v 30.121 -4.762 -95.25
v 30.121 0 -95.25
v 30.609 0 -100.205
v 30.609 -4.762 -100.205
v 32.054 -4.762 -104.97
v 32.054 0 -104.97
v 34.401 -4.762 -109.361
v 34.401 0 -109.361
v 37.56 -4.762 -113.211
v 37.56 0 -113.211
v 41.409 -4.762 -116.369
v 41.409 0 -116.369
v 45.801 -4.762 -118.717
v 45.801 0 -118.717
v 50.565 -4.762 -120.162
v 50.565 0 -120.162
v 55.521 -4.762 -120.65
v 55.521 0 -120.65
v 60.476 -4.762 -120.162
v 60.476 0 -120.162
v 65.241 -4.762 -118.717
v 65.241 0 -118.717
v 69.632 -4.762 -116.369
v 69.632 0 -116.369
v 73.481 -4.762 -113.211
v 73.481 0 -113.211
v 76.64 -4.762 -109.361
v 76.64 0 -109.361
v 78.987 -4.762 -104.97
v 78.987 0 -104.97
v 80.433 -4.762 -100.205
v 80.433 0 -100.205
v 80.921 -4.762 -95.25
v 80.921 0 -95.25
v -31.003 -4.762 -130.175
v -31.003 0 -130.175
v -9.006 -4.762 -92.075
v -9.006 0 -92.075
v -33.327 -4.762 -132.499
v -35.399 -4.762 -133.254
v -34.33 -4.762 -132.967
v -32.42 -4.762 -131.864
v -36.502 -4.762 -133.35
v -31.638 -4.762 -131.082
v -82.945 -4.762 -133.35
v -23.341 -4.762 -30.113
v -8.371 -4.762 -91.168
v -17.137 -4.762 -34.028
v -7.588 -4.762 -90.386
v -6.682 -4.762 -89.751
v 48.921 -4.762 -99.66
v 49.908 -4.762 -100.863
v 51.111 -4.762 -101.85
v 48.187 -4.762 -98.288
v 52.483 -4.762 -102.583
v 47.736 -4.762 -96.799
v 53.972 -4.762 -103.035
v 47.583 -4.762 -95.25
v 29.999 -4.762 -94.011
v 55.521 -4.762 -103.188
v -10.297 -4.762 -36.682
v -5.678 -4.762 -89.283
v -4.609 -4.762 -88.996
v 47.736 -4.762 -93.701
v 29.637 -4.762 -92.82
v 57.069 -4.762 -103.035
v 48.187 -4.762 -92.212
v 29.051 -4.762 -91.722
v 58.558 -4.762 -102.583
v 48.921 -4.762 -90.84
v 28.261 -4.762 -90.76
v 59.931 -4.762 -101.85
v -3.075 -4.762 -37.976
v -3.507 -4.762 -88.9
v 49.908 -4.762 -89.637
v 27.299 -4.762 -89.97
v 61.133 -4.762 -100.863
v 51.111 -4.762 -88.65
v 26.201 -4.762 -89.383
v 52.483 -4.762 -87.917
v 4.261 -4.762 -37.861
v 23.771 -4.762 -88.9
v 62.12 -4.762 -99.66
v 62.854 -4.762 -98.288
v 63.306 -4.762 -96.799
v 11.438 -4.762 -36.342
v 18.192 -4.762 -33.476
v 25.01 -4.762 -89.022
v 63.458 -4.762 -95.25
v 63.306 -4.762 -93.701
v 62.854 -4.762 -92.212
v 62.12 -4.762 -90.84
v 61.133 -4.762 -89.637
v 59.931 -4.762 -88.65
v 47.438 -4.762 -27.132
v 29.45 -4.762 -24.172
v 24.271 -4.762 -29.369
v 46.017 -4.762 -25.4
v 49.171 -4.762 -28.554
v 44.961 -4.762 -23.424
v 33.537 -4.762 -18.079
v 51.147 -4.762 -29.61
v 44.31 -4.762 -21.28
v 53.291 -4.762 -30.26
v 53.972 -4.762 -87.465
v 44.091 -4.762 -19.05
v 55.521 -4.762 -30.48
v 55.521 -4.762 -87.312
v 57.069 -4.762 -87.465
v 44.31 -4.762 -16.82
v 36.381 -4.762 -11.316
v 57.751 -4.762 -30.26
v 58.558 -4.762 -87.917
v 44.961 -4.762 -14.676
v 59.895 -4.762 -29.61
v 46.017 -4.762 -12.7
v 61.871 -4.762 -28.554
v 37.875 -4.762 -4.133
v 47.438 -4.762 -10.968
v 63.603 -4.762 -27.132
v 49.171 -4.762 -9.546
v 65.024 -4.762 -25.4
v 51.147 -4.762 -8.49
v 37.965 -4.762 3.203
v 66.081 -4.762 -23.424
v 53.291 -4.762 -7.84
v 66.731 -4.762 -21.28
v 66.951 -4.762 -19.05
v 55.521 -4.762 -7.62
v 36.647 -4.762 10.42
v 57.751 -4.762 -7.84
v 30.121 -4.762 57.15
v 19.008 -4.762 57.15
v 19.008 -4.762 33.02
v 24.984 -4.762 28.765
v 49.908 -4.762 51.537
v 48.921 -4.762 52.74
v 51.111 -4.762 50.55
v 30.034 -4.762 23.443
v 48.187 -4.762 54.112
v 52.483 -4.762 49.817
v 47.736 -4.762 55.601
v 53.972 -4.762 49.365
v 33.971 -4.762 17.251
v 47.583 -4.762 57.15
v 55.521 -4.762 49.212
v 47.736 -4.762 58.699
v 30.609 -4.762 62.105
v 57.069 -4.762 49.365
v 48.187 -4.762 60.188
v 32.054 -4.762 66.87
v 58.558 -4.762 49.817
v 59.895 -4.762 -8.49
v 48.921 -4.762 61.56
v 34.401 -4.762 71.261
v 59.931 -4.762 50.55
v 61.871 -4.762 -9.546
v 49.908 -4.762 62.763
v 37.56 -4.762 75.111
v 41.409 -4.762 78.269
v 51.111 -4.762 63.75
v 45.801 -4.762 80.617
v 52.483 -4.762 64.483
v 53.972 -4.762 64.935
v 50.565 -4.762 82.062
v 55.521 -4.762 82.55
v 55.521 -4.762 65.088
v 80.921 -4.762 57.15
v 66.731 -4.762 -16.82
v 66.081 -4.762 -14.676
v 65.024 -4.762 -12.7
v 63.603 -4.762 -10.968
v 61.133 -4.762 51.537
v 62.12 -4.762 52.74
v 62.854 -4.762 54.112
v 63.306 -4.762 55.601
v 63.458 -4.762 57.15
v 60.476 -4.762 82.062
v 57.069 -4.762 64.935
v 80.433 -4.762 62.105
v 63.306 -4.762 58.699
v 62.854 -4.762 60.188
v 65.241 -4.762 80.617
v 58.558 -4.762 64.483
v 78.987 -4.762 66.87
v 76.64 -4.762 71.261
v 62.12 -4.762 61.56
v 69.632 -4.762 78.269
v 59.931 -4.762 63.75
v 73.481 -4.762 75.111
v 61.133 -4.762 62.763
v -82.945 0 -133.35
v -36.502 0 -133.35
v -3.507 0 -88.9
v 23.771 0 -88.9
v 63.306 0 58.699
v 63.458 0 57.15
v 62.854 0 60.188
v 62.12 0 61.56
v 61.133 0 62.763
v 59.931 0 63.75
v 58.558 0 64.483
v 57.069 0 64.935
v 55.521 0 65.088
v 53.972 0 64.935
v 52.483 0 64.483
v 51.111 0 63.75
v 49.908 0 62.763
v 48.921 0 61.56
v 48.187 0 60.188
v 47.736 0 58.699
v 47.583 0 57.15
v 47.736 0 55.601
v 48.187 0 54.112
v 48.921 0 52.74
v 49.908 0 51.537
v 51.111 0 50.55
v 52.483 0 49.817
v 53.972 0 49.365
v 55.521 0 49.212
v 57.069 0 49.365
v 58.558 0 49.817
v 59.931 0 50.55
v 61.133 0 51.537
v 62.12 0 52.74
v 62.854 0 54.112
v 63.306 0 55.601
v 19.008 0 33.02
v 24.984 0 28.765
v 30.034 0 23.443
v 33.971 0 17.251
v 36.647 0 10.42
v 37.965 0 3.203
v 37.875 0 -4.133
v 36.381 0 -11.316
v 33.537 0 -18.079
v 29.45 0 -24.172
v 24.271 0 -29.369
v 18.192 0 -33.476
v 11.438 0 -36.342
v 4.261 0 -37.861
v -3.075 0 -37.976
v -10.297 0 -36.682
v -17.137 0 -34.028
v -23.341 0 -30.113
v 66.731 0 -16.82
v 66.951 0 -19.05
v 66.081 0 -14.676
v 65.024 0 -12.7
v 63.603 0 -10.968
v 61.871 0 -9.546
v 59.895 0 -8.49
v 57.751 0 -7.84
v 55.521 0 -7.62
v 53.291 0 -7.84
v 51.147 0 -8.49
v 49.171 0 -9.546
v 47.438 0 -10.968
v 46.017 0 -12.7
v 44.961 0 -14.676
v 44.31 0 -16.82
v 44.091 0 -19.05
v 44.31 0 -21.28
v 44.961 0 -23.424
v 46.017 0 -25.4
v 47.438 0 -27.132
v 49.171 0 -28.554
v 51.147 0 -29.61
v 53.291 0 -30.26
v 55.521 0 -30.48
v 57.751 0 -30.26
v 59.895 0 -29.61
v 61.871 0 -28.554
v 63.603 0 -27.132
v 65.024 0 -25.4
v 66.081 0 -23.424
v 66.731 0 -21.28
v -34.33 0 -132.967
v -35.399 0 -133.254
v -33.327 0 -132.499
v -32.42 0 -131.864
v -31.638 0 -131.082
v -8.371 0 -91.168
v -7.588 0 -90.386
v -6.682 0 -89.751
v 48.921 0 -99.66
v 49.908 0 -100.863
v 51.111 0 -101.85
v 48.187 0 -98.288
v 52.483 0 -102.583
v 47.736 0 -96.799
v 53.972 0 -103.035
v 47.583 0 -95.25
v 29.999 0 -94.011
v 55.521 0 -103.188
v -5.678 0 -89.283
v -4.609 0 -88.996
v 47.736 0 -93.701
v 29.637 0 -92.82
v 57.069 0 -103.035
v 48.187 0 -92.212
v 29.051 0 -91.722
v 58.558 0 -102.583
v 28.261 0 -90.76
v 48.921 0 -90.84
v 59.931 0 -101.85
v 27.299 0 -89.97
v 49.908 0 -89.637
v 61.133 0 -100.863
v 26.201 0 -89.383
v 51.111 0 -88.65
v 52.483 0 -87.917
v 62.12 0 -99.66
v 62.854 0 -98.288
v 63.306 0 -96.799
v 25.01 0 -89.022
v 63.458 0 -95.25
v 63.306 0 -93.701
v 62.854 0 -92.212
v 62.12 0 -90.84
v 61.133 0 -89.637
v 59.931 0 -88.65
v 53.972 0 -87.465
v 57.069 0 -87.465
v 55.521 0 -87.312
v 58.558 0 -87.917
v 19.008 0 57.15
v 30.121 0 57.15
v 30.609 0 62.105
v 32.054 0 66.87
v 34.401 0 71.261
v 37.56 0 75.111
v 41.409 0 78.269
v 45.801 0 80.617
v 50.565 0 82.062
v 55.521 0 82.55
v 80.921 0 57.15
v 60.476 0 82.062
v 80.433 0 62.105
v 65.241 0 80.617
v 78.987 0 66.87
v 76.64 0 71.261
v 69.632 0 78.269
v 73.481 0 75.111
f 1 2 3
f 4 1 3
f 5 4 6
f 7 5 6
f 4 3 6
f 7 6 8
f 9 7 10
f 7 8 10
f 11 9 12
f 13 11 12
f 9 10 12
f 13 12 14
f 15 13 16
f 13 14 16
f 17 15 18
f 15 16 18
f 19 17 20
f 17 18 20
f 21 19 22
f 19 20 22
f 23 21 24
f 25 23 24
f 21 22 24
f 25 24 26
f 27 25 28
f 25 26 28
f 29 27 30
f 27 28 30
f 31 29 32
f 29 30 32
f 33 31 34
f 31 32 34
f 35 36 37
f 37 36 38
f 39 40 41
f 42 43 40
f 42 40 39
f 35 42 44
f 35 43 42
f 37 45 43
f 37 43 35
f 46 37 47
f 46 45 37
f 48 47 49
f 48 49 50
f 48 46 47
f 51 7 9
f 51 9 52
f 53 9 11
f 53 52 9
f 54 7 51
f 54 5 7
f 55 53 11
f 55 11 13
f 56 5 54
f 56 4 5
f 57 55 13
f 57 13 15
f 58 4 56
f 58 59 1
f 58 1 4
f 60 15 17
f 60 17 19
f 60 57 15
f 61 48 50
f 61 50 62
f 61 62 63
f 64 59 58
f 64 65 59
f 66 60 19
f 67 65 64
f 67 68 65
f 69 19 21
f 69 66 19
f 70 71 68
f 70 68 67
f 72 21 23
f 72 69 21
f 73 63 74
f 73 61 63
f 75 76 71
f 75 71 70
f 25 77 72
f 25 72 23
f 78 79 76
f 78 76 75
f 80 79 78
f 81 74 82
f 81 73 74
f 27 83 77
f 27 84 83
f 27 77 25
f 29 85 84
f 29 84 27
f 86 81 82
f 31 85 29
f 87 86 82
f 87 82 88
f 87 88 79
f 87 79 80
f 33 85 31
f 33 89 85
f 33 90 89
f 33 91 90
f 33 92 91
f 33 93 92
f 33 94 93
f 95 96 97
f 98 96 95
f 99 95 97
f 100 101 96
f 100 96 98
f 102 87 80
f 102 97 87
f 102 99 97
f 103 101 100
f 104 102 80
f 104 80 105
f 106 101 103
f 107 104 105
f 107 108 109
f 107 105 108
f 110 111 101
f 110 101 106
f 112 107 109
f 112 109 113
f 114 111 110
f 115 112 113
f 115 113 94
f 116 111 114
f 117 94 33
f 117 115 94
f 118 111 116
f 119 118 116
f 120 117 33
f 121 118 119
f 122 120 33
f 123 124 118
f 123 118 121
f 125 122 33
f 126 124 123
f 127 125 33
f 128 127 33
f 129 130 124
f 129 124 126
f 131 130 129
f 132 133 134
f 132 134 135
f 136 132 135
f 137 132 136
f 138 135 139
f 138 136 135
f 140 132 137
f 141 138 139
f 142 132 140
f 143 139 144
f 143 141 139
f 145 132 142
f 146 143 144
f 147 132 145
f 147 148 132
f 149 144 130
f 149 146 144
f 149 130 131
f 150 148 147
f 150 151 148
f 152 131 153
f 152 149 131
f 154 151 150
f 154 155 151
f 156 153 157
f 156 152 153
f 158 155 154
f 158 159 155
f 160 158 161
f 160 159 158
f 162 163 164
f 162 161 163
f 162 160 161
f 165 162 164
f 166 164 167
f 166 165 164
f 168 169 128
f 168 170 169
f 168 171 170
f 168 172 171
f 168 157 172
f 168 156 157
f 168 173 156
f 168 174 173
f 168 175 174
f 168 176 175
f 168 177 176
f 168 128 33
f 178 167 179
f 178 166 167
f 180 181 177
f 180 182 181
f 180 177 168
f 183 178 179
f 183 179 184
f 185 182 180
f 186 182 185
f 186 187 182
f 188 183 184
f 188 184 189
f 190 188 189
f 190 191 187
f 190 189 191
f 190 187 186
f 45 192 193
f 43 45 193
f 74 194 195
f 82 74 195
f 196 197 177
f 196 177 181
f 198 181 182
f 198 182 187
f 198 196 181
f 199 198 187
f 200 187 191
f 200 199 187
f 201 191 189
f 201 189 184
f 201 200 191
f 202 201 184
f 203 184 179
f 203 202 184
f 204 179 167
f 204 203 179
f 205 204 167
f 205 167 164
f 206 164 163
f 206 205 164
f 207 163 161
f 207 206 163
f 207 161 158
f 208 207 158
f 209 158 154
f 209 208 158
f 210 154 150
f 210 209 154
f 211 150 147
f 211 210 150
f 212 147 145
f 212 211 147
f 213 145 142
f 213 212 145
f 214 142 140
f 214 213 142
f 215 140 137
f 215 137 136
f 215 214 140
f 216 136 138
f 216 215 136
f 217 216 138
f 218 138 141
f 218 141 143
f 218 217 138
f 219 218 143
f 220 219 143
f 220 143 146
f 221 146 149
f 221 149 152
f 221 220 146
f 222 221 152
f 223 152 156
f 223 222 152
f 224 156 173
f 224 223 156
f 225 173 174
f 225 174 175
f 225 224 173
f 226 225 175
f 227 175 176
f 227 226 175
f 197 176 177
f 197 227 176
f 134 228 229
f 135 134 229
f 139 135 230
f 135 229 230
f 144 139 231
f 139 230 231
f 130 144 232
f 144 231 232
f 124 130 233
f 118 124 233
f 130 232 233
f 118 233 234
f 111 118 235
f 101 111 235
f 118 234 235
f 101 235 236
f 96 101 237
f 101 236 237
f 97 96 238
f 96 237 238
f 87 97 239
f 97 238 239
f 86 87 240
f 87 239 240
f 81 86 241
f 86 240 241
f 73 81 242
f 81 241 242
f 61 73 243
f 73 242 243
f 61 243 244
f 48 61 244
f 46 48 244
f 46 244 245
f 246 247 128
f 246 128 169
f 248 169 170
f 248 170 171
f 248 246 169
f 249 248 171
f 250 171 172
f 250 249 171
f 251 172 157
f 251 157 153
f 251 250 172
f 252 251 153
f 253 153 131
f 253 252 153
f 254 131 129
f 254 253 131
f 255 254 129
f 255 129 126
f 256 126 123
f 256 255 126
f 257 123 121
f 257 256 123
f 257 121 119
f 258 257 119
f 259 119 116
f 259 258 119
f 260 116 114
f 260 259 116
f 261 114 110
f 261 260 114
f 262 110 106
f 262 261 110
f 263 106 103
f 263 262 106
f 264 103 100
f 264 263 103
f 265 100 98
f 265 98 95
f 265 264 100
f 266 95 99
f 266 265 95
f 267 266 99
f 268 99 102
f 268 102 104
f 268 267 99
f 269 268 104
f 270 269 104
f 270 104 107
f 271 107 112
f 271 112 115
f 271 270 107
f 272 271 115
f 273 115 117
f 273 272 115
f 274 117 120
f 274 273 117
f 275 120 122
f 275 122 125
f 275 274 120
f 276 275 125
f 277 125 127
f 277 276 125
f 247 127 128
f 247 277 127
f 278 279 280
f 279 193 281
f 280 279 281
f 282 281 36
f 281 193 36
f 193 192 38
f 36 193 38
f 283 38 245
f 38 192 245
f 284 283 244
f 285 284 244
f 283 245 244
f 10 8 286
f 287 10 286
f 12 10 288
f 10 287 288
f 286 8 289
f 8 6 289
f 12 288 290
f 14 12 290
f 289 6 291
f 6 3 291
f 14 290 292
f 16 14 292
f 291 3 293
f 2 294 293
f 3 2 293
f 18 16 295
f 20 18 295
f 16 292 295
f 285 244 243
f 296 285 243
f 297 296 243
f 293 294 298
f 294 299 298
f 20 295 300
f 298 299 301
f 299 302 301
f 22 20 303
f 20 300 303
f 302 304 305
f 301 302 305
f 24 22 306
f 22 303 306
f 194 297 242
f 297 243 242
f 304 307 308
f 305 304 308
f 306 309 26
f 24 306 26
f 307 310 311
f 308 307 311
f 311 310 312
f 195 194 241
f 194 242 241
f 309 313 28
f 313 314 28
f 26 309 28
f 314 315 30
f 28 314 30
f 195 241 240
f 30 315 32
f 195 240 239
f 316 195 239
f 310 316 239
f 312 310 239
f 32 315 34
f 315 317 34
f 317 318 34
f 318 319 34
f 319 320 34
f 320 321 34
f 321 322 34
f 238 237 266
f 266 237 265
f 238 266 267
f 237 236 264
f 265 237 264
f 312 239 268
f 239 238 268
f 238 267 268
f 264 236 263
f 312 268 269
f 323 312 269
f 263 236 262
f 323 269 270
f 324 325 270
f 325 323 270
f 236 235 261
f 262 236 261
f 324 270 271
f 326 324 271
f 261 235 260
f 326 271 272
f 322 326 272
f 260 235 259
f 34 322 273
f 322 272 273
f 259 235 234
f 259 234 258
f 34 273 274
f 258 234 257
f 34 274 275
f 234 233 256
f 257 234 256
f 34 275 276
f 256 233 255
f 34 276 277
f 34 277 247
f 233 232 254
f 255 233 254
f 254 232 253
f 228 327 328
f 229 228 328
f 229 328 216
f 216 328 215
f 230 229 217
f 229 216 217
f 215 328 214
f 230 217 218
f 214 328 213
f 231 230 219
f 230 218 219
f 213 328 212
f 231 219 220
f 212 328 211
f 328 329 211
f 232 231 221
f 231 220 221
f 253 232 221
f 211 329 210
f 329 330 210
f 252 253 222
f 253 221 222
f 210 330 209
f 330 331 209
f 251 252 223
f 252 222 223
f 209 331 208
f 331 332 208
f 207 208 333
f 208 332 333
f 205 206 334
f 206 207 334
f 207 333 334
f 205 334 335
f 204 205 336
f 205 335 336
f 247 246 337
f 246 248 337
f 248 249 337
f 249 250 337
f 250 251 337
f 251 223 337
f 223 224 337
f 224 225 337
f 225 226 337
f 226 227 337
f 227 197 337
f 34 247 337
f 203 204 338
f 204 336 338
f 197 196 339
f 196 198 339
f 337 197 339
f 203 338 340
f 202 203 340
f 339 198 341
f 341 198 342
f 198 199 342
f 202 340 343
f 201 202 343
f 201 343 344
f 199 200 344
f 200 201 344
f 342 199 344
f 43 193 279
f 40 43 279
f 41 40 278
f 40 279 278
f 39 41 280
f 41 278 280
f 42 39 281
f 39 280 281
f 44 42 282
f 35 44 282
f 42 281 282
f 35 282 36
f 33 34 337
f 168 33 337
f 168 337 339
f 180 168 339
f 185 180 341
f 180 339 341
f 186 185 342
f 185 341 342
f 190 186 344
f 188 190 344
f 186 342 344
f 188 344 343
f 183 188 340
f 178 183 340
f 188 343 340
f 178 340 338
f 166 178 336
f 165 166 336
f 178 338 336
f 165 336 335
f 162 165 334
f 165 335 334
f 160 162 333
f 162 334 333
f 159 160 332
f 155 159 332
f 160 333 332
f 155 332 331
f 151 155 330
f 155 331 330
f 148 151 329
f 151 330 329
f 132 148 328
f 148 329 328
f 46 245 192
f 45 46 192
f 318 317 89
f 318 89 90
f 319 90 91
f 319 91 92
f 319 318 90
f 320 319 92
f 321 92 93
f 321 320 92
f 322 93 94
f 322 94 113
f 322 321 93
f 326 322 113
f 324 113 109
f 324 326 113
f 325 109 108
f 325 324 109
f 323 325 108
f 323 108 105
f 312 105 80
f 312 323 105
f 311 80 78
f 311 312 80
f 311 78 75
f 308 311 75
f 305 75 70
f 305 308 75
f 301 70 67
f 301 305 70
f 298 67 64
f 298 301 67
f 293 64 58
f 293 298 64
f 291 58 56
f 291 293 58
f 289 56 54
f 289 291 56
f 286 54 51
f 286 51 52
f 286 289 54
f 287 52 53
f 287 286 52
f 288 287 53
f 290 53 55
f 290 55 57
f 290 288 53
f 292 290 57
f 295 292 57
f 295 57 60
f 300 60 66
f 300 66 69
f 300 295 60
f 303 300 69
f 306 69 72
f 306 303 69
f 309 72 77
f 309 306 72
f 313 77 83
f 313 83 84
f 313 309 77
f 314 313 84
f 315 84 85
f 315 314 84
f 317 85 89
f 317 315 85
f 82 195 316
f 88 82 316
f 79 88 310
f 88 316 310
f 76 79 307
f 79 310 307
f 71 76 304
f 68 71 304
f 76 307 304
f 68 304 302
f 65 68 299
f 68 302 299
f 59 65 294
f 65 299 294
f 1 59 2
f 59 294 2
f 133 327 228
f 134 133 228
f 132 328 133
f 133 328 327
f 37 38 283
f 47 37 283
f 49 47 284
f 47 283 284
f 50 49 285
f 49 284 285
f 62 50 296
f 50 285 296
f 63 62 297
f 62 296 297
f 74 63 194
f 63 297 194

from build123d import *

# Parameters (mm, degrees)
F0_R     = 7.9375
F0_R_2   = 11.43
F1_DEPTH = 4.7625


with BuildPart() as f1:
    # F0 (on Front) → F1 (new body)
    with BuildSketch(Plane.XZ):
        with BuildLine():
            Line((30.120686, 57.15), (19.00762, 57.15))
            Line((19.00762, 57.15), (19.00762, 33.02))
            ThreePointArc((19.00762, 33.02), (31.640757, -21.224337), (-23.341394, -30.112943))
            Line((-23.341394, -30.112943), (-82.945339, -133.350004))
            Line((-82.945339, -133.350004), (-36.502154, -133.350004))
            ThreePointArc((-36.502154, -133.350004), (-33.327154, -132.499265), (-31.002893, -130.175004))
            Line((-31.002893, -130.175004), (-9.005846, -92.075))
            ThreePointArc((-9.005846, -92.075), (-6.681584, -89.750739), (-3.506584, -88.9))
            Line((-3.506584, -88.9), (23.770686, -88.9))
            ThreePointArc((23.770686, -88.9), (28.260814, -90.759872), (30.120686, -95.25))
            ThreePointArc((30.120686, -95.25), (55.520686, -120.65), (80.920686, -95.25))
            Line((80.920686, -95.25), (80.920686, 57.15))
            ThreePointArc((80.920686, 57.15), (55.520686, 82.55), (30.120686, 57.15))
        make_face()
        with Locations((55.520686, -95.25)):
            Circle(F0_R, mode=Mode.SUBTRACT)
        with Locations((55.520686, -19.05)):
            Circle(F0_R_2, mode=Mode.SUBTRACT)
        with Locations((55.520686, 57.15)):
            Circle(F0_R, mode=Mode.SUBTRACT)
    extrude(amount=F1_DEPTH)


solid = f1.part
